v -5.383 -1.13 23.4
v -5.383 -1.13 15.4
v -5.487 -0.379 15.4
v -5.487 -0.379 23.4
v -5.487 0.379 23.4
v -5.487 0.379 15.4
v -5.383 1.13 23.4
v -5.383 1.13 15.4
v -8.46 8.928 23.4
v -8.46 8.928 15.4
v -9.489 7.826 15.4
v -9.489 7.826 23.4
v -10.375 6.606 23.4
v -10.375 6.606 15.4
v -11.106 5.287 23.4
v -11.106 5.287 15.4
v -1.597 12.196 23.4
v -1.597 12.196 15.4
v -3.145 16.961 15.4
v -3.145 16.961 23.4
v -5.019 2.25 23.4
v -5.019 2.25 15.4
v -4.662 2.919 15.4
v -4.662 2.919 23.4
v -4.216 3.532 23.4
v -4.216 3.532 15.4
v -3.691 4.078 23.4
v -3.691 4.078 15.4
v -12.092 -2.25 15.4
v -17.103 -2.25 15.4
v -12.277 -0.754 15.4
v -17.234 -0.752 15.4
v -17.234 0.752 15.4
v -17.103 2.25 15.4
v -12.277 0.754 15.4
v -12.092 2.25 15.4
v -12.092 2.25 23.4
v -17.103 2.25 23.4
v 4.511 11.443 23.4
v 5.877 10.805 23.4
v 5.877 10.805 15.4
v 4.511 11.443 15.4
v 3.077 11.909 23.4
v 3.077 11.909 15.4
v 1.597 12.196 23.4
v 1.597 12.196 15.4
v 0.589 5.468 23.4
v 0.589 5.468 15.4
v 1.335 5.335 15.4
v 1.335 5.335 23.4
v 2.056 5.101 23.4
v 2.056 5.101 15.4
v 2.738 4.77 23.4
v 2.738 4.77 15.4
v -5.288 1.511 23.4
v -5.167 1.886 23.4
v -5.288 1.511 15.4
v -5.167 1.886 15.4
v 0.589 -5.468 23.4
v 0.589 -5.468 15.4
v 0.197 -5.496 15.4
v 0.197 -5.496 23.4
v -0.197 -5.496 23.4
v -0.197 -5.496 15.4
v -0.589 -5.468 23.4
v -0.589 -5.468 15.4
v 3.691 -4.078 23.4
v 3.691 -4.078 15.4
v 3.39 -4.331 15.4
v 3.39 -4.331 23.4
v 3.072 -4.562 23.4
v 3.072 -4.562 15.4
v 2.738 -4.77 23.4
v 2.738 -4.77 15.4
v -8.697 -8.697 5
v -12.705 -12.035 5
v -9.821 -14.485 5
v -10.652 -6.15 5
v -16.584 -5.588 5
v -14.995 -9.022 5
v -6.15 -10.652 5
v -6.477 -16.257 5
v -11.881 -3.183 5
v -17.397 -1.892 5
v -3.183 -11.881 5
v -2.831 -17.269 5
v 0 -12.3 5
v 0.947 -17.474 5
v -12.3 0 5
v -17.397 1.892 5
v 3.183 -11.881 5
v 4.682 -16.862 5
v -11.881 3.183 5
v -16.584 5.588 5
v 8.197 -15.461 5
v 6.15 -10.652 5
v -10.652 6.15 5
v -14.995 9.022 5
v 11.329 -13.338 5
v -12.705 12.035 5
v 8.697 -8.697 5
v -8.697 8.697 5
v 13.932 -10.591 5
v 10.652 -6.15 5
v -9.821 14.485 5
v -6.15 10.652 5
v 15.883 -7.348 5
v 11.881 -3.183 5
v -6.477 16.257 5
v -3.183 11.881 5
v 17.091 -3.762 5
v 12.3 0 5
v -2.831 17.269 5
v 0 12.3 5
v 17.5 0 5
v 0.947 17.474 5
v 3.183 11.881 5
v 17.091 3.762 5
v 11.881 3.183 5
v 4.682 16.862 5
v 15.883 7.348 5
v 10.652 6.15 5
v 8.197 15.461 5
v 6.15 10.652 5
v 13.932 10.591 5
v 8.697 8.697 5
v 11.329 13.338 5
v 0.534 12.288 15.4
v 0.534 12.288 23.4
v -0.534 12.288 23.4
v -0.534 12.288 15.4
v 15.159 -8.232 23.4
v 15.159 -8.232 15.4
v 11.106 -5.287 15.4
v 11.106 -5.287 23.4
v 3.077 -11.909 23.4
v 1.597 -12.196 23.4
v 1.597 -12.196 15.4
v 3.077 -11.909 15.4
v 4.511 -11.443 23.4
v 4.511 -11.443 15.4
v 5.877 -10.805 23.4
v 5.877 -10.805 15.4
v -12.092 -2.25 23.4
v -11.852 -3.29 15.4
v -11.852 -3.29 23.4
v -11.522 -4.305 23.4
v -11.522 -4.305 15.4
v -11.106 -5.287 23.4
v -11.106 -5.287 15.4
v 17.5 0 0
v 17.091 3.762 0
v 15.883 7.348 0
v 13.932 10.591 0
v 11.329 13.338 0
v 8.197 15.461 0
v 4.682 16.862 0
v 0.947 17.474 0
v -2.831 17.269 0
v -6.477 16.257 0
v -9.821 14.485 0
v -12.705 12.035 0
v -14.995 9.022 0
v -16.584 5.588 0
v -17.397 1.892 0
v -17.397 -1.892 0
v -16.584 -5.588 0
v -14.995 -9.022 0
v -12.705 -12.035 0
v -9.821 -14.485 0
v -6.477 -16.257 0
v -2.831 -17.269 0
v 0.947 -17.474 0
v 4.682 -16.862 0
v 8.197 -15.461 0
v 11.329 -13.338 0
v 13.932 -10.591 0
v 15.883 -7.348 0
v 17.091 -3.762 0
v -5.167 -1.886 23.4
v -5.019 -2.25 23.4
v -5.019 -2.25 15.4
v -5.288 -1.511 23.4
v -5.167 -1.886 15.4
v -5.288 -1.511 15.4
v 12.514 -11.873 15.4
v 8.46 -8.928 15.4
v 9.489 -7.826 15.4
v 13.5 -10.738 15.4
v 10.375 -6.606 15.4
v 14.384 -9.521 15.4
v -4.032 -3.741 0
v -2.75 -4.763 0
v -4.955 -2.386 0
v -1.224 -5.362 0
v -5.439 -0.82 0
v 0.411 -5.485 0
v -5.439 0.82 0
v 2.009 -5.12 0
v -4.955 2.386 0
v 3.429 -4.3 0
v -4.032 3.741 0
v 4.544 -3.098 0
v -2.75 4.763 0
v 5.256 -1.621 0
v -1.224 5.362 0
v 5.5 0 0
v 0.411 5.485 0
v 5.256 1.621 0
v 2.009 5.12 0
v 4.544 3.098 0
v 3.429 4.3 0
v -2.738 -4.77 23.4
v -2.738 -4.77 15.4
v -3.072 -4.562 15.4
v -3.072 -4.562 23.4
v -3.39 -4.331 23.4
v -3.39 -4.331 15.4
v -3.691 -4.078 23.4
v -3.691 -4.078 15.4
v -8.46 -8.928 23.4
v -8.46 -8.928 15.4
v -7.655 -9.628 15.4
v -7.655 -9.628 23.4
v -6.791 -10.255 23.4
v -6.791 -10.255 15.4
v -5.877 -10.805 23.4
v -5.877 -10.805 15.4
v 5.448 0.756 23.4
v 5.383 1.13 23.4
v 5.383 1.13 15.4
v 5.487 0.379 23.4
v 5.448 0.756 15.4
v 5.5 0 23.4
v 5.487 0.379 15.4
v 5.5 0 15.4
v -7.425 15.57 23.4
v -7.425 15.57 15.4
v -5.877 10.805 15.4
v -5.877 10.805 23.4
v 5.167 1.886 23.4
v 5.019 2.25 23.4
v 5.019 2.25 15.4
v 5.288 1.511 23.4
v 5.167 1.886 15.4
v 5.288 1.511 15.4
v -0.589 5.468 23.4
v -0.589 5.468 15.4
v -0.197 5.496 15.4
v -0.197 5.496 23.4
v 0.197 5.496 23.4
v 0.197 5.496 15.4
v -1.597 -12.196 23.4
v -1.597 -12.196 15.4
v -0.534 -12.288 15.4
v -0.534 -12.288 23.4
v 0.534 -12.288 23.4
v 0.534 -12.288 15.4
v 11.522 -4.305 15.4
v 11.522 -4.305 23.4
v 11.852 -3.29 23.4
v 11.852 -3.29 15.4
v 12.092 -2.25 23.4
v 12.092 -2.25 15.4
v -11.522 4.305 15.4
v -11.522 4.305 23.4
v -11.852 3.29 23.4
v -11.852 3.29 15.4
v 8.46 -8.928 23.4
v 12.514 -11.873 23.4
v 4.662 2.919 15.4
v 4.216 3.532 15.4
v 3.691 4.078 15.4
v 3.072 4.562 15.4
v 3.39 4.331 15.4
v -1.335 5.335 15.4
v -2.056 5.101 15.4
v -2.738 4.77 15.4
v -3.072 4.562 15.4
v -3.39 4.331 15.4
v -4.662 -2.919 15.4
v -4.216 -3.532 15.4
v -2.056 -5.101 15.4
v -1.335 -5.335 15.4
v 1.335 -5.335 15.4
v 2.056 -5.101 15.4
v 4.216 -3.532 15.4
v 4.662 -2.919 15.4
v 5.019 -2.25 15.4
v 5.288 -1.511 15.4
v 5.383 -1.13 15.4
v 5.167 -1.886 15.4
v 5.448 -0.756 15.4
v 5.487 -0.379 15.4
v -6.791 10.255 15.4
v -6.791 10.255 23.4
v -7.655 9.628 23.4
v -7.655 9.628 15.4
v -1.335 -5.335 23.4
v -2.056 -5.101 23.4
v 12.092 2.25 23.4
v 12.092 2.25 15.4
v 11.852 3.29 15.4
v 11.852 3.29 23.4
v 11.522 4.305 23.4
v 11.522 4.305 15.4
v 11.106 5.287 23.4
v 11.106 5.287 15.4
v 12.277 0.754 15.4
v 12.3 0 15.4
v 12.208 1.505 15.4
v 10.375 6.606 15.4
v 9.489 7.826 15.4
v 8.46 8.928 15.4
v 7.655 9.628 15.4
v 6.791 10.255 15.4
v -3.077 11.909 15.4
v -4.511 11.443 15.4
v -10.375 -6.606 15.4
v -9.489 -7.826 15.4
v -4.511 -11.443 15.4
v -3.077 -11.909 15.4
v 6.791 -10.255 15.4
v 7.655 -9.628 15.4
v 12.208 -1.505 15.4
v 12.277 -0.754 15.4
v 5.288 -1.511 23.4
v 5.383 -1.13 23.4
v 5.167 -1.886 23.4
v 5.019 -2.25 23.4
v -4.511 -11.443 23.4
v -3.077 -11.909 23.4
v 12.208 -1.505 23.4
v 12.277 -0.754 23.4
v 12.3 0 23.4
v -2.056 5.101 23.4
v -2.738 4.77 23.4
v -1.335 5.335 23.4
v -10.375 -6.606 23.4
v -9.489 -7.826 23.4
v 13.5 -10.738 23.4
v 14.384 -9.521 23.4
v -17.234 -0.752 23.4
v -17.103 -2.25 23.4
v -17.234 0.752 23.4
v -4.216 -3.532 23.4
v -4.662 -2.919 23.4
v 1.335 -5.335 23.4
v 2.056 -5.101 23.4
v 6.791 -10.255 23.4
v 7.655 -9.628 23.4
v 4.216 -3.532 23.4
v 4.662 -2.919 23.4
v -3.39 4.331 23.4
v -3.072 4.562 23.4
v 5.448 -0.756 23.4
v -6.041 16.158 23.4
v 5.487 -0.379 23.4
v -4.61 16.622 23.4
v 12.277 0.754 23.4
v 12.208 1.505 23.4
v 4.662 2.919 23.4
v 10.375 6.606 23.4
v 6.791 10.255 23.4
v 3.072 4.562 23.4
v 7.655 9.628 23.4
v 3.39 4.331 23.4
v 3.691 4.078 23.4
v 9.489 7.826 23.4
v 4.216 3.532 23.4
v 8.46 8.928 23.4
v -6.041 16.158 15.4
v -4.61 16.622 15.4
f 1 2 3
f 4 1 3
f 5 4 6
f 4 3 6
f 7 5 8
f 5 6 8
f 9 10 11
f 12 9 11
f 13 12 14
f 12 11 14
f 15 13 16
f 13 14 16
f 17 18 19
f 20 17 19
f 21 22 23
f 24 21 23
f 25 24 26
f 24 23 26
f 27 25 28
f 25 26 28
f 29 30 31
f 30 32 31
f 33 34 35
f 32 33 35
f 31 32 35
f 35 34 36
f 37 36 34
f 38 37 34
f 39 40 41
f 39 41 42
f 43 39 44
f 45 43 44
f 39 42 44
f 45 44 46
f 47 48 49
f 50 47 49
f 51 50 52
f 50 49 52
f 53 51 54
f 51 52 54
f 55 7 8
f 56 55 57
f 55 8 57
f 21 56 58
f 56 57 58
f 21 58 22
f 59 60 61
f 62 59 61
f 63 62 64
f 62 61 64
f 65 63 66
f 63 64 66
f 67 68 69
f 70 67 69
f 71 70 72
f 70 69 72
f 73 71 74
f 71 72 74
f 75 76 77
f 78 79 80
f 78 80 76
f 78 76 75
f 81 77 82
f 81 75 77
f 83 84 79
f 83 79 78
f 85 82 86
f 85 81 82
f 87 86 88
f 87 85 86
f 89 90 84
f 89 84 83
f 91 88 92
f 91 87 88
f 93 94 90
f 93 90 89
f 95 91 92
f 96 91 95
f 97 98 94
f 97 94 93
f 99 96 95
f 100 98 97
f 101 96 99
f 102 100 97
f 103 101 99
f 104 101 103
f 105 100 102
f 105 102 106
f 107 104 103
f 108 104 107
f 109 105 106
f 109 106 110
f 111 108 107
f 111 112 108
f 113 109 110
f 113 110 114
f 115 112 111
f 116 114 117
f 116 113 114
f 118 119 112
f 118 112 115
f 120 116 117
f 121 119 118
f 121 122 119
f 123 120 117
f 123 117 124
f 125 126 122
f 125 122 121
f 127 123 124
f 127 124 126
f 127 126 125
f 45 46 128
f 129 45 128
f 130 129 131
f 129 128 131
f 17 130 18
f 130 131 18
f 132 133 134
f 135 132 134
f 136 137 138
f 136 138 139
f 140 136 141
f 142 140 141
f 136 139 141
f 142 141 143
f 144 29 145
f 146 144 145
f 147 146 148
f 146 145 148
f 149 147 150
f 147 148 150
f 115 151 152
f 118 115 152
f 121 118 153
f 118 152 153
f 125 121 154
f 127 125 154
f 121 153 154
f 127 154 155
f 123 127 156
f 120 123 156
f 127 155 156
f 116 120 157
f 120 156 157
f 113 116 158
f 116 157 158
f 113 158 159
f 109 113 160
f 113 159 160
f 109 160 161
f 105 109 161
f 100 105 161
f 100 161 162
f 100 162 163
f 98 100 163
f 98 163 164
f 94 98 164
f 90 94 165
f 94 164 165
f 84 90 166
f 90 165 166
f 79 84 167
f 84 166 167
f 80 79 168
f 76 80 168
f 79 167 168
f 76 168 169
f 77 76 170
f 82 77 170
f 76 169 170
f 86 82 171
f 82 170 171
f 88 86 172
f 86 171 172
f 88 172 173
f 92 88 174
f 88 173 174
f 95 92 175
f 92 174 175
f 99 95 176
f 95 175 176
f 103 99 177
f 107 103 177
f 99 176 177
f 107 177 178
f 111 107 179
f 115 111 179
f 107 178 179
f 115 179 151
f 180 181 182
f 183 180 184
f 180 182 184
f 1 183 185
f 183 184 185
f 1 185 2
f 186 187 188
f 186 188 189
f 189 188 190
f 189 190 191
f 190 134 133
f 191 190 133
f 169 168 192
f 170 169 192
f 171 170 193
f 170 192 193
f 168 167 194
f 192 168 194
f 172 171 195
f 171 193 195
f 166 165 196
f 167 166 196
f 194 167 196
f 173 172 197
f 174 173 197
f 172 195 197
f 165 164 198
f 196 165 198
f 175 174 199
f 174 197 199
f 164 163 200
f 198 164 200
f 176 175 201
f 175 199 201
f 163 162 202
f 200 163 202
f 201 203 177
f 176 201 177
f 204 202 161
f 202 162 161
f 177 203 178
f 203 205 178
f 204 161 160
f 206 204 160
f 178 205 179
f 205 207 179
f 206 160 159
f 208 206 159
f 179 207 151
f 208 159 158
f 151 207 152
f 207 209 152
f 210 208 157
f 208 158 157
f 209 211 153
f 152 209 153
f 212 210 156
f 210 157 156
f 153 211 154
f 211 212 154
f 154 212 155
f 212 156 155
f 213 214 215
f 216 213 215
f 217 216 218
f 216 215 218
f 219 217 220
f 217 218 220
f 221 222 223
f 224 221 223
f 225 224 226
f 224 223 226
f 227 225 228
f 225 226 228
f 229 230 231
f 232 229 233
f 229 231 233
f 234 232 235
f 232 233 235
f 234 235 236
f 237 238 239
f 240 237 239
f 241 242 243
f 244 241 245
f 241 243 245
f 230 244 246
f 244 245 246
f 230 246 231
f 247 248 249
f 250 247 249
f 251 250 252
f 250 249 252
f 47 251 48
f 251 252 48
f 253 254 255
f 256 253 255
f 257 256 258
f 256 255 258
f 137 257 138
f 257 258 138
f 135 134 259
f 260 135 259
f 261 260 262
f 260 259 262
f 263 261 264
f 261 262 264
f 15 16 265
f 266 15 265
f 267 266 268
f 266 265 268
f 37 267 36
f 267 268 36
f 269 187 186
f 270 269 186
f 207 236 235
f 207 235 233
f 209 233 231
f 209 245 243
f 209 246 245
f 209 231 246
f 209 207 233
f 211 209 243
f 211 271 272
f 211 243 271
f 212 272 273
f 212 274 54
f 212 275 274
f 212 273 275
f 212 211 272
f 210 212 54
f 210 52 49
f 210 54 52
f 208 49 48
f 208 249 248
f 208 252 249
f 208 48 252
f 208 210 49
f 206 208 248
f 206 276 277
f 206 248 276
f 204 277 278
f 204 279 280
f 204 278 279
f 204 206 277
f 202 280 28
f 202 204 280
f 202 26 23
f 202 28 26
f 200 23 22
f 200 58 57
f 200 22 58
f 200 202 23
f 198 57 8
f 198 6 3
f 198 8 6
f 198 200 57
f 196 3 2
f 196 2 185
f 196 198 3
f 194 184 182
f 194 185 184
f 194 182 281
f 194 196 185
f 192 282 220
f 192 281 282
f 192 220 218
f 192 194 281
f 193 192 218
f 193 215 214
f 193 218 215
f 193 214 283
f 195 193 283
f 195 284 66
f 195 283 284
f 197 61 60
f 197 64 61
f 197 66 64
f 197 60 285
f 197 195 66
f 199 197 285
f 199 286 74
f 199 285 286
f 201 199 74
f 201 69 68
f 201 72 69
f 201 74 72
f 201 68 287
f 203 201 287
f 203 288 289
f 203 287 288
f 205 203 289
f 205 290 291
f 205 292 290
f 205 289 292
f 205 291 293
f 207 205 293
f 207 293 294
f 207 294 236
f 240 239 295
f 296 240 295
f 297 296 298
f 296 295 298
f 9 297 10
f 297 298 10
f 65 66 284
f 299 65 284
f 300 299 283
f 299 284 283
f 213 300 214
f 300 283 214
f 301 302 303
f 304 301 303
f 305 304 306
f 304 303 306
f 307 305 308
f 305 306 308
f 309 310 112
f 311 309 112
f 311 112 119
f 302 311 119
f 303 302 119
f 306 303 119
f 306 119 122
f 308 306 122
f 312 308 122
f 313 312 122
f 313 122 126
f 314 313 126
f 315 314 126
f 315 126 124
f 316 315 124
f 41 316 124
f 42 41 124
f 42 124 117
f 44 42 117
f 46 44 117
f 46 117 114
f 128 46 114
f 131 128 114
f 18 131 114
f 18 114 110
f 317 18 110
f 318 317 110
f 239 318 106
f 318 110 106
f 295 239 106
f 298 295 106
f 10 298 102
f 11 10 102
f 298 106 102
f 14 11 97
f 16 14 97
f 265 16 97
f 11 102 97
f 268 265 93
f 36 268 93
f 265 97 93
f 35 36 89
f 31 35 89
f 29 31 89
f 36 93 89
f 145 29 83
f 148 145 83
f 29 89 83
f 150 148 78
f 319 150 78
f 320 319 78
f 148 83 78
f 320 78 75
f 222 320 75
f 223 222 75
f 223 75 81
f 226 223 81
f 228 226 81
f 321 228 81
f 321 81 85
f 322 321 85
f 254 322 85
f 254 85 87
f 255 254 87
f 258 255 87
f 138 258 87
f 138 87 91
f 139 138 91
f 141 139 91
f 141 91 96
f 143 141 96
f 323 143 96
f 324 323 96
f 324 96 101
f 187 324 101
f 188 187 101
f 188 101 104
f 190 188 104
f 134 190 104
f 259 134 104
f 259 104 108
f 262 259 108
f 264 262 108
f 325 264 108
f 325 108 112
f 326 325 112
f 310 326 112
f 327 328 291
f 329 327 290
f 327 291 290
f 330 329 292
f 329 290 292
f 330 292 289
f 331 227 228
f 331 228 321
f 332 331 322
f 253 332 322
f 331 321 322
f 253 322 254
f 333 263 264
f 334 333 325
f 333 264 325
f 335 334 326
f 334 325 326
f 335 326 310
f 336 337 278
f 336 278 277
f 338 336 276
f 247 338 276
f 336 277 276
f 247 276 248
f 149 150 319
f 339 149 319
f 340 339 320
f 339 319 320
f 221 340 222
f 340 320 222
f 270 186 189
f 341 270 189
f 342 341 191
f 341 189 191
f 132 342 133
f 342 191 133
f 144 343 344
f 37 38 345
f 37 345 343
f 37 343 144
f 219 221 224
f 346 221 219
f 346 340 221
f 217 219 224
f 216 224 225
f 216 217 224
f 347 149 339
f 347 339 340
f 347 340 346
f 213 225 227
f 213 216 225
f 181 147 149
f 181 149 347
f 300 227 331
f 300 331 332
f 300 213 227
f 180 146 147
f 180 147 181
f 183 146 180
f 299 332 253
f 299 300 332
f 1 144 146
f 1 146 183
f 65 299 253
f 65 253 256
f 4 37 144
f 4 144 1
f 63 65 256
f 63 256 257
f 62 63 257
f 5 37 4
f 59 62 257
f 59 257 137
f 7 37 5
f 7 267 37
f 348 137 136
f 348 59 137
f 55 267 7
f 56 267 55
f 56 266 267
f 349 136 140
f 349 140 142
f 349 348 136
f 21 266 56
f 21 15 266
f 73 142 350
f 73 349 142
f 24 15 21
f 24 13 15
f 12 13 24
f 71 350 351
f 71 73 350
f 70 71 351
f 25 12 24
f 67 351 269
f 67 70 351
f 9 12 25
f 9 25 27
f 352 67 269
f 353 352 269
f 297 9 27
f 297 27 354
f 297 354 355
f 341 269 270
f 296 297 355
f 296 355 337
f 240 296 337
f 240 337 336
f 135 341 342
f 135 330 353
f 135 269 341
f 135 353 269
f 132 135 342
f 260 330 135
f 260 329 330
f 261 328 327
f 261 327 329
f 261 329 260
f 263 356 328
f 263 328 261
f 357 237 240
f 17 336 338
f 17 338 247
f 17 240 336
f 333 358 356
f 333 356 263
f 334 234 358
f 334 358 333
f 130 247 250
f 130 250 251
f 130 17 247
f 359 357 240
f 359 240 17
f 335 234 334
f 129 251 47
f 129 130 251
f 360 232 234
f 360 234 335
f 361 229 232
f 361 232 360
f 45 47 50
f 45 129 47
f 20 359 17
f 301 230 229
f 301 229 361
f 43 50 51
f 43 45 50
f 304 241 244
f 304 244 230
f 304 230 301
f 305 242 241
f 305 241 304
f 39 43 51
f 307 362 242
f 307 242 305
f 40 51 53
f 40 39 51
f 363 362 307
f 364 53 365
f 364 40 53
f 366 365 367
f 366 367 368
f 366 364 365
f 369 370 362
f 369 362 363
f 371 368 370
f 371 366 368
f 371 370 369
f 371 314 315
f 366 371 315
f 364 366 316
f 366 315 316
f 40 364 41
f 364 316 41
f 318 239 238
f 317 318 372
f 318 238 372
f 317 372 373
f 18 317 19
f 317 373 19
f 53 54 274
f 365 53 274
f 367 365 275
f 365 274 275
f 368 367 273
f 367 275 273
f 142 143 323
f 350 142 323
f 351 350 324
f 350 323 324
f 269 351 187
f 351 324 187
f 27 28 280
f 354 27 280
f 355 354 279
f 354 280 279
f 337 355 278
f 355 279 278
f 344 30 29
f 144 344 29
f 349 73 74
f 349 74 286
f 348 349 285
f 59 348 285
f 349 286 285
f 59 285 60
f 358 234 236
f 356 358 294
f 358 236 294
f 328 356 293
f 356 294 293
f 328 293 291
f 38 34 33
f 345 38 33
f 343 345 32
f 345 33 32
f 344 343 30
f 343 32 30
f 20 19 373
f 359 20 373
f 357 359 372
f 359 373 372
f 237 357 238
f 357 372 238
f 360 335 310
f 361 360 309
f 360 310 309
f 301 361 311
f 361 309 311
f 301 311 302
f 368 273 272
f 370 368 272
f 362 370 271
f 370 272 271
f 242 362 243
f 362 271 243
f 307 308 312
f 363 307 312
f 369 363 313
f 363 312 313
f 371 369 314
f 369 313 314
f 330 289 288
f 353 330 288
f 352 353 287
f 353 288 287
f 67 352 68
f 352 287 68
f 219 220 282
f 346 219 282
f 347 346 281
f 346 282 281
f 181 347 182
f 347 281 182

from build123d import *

# Parameters (mm, degrees)
F0_R     = 17.5
F0_R_2   = 5.5
F1_DEPTH = 5
F2_R     = 12.3
F2_R_2   = 5.5
F3_DEPTH = 10.4
F5_DEPTH = 8


with BuildPart() as f1:
    # F0 (on Top) → F1 (new body)
    with BuildSketch(Plane.XY):
        Circle(F0_R)
        Circle(F0_R_2, mode=Mode.SUBTRACT)
    extrude(amount=F1_DEPTH)

    # F2 (on face) → F3 (join)
    with BuildSketch(Plane.XY.offset(5)):
        Circle(F2_R)
        Circle(F2_R_2, mode=Mode.SUBTRACT)
    extrude(amount=F3_DEPTH)

    # F4 (on face) → F5 (join)
    with BuildSketch(Plane.XY.offset(15.4)):
        with BuildLine():
            Line((-1.5968973469, 12.1958976243), (-3.1451265822, 16.9608572537))
            ThreePointArc((-3.1451265822, 16.9608572537), (-5.330543153, 16.4057249061), (-7.4248809055, 15.5702807791))
            Line((-7.4248809055, 15.5702807791), (-5.8766516702, 10.8053211497))
            ThreePointArc((-5.8766516702, 10.8053211497), (-3.8009090308, 11.6979951504), (-1.5968973469, 12.1958976243))
        make_face()
        with BuildLine():
            ThreePointArc((-17.1026313765, 2.25), (-17.25, 0), (-17.1026313765, -2.25))
            Line((-17.1026313765, -2.25), (-12.0924563262, -2.25))
            ThreePointArc((-12.0924563262, -2.25), (-12.3, 0), (-12.0924563262, 2.25))
            Line((-12.0924563262, 2.25), (-17.1026313765, 2.25))
        make_face()
        with BuildLine():
            ThreePointArc((12.5138026145, -11.8729627358), (13.955543153, -10.139295602), (15.1588362498, -8.2323862612))
            Line((15.1588362498, -8.2323862612), (11.1055194893, -5.2874792552))
            ThreePointArc((11.1055194893, -5.2874792552), (9.9509090308, -7.2297586032), (8.4604858539, -8.9280557298))
            Line((8.4604858539, -8.9280557298), (12.5138026145, -11.8729627358))
        make_face()
        with BuildLine():
            Line((11.1055194893, -5.2874792552), (6.9247879586, -2.25))
            Line((6.9247879586, -2.25), (5.018714975, -2.25))
            ThreePointArc((5.018714975, -2.25), (4.4495934691, -3.2328188876), (3.6907453789, -4.077793343))
            Line((3.6907453789, -4.077793343), (4.2797543233, -5.8905764747))
            Line((4.2797543233, -5.8905764747), (8.4604858539, -8.9280557298))
            ThreePointArc((8.4604858539, -8.9280557298), (9.9509090308, -7.2297586032), (11.1055194893, -5.2874792552))
        make_face()
        with BuildLine():
            ThreePointArc((11.1055194893, -5.2874792552), (11.6979951504, -3.8009090308), (12.0924563262, -2.25))
            Line((12.0924563262, -2.25), (6.9247879586, -2.25))
            Line((6.9247879586, -2.25), (11.1055194893, -5.2874792552))
        make_face()
        with BuildLine():
            Line((6.9247879586, -2.25), (12.0924563262, -2.25))
            ThreePointArc((12.0924563262, -2.25), (12.2480041805, -1.1297759044), (12.3, 0))
            ThreePointArc((12.3, 0), (12.2480041805, 1.1297759044), (12.0924563262, 2.25))
            Line((12.0924563262, 2.25), (6.9247879586, 2.25))
            Line((6.9247879586, 2.25), (5.3827425223, 1.1296384104))
            ThreePointArc((5.3827425223, 1.1296384104), (5.4706070903, 0.5678539104), (5.5, 0))
            ThreePointArc((5.5, 0), (5.4706070903, -0.5678539104), (5.3827425223, -1.1296384104))
            Line((5.3827425223, -1.1296384104), (6.9247879586, -2.25))
        make_face()
        with BuildLine():
            Line((6.9247879586, 2.25), (12.0924563262, 2.25))
            ThreePointArc((12.0924563262, 2.25), (11.6979951504, 3.8009090308), (11.1055194893, 5.2874792552))
            Line((11.1055194893, 5.2874792552), (6.9247879586, 2.25))
        make_face()
        with BuildLine():
            Line((5.018714975, 2.25), (6.9247879586, 2.25))
            Line((6.9247879586, 2.25), (11.1055194893, 5.2874792552))
            ThreePointArc((11.1055194893, 5.2874792552), (9.9509090308, 7.2297586032), (8.4604858539, 8.9280557298))
            Line((8.4604858539, 8.9280557298), (4.2797543233, 5.8905764747))
            Line((4.2797543233, 5.8905764747), (3.6907453789, 4.077793343))
            ThreePointArc((3.6907453789, 4.077793343), (4.4495934691, 3.2328188876), (5.018714975, 2.25))
        make_face()
        with BuildLine():
            Line((4.2797543233, 5.8905764747), (8.4604858539, 8.9280557298))
            ThreePointArc((8.4604858539, 8.9280557298), (7.2297586032, 9.9509090308), (5.8766516702, 10.8053211497))
            Line((5.8766516702, 10.8053211497), (4.2797543233, 5.8905764747))
        make_face()
        with BuildLine():
            Line((2.737708887, 4.7702148851), (4.2797543233, 5.8905764747))
            Line((4.2797543233, 5.8905764747), (5.8766516702, 10.8053211497))
            ThreePointArc((5.8766516702, 10.8053211497), (3.8009090308, 11.6979951504), (1.5968973469, 12.1958976243))
            Line((1.5968973469, 12.1958976243), (0, 7.2811529494))
            Line((0, 7.2811529494), (0.5890089445, 5.4683698177))
            ThreePointArc((0.5890089445, 5.4683698177), (1.6995934691, 5.2308108396), (2.737708887, 4.7702148851))
        make_face()
        with BuildLine():
            Line((0, 7.2811529494), (1.5968973469, 12.1958976243))
            ThreePointArc((1.5968973469, 12.1958976243), (0, 12.3), (-1.5968973469, 12.1958976243))
            Line((-1.5968973469, 12.1958976243), (0, 7.2811529494))
        make_face()
        with BuildLine():
            Line((-0.5890089445, 5.4683698177), (0, 7.2811529494))
            Line((0, 7.2811529494), (-1.5968973469, 12.1958976243))
            ThreePointArc((-1.5968973469, 12.1958976243), (-3.8009090308, 11.6979951504), (-5.8766516702, 10.8053211497))
            Line((-5.8766516702, 10.8053211497), (-4.2797543233, 5.8905764747))
            Line((-4.2797543233, 5.8905764747), (-2.737708887, 4.7702148851))
            ThreePointArc((-2.737708887, 4.7702148851), (-1.6995934691, 5.2308108396), (-0.5890089445, 5.4683698177))
        make_face()
        with BuildLine():
            Line((-4.2797543233, 5.8905764747), (-5.8766516702, 10.8053211497))
            ThreePointArc((-5.8766516702, 10.8053211497), (-7.2297586032, 9.9509090308), (-8.4604858539, 8.9280557298))
            Line((-8.4604858539, 8.9280557298), (-4.2797543233, 5.8905764747))
        make_face()
        with BuildLine():
            Line((-3.6907453789, 4.077793343), (-4.2797543233, 5.8905764747))
            Line((-4.2797543233, 5.8905764747), (-8.4604858539, 8.9280557298))
            ThreePointArc((-8.4604858539, 8.9280557298), (-9.9509090308, 7.2297586032), (-11.1055194893, 5.2874792552))
            Line((-11.1055194893, 5.2874792552), (-6.9247879586, 2.25))
            Line((-6.9247879586, 2.25), (-5.018714975, 2.25))
            ThreePointArc((-5.018714975, 2.25), (-4.4495934691, 3.2328188876), (-3.6907453789, 4.077793343))
        make_face()
        with BuildLine():
            Line((-6.9247879586, 2.25), (-11.1055194893, 5.2874792552))
            ThreePointArc((-11.1055194893, 5.2874792552), (-11.6979951504, 3.8009090308), (-12.0924563262, 2.25))
            Line((-12.0924563262, 2.25), (-6.9247879586, 2.25))
        make_face()
        with BuildLine():
            Line((-12.0924563262, -2.25), (-6.9247879586, -2.25))
            Line((-6.9247879586, -2.25), (-5.3827425223, -1.1296384104))
            ThreePointArc((-5.3827425223, -1.1296384104), (-5.5, 0), (-5.3827425223, 1.1296384104))
            Line((-5.3827425223, 1.1296384104), (-6.9247879586, 2.25))
            Line((-6.9247879586, 2.25), (-12.0924563262, 2.25))
            ThreePointArc((-12.0924563262, 2.25), (-12.3, 0), (-12.0924563262, -2.25))
        make_face()
        with BuildLine():
            ThreePointArc((-12.0924563262, -2.25), (-11.6979951504, -3.8009090308), (-11.1055194893, -5.2874792552))
            Line((-11.1055194893, -5.2874792552), (-6.9247879586, -2.25))
            Line((-6.9247879586, -2.25), (-12.0924563262, -2.25))
        make_face()
        with BuildLine():
            Line((-8.4604858539, -8.9280557298), (-4.2797543233, -5.8905764747))
            Line((-4.2797543233, -5.8905764747), (-3.6907453789, -4.077793343))
            ThreePointArc((-3.6907453789, -4.077793343), (-4.4495934691, -3.2328188876), (-5.018714975, -2.25))
            Line((-5.018714975, -2.25), (-6.9247879586, -2.25))
            Line((-6.9247879586, -2.25), (-11.1055194893, -5.2874792552))
            ThreePointArc((-11.1055194893, -5.2874792552), (-9.9509090308, -7.2297586032), (-8.4604858539, -8.9280557298))
        make_face()
        with BuildLine():
            ThreePointArc((-8.4604858539, -8.9280557298), (-7.2297586032, -9.9509090308), (-5.8766516702, -10.8053211497))
            Line((-5.8766516702, -10.8053211497), (-4.2797543233, -5.8905764747))
            Line((-4.2797543233, -5.8905764747), (-8.4604858539, -8.9280557298))
        make_face()
        with BuildLine():
            Line((-1.5968973469, -12.1958976243), (0, -7.2811529494))
            Line((0, -7.2811529494), (-0.5890089445, -5.4683698177))
            ThreePointArc((-0.5890089445, -5.4683698177), (-1.6995934691, -5.2308108396), (-2.737708887, -4.7702148851))
            Line((-2.737708887, -4.7702148851), (-4.2797543233, -5.8905764747))
            Line((-4.2797543233, -5.8905764747), (-5.8766516702, -10.8053211497))
            ThreePointArc((-5.8766516702, -10.8053211497), (-3.8009090308, -11.6979951504), (-1.5968973469, -12.1958976243))
        make_face()
        with BuildLine():
            ThreePointArc((-1.5968973469, -12.1958976243), (0, -12.3), (1.5968973469, -12.1958976243))
            Line((1.5968973469, -12.1958976243), (0, -7.2811529494))
            Line((0, -7.2811529494), (-1.5968973469, -12.1958976243))
        make_face()
        with BuildLine():
            Line((5.8766516702, -10.8053211497), (4.2797543233, -5.8905764747))
            Line((4.2797543233, -5.8905764747), (2.737708887, -4.7702148851))
            ThreePointArc((2.737708887, -4.7702148851), (1.6995934691, -5.2308108396), (0.5890089445, -5.4683698177))
            Line((0.5890089445, -5.4683698177), (0, -7.2811529494))
            Line((0, -7.2811529494), (1.5968973469, -12.1958976243))
            ThreePointArc((1.5968973469, -12.1958976243), (3.8009090308, -11.6979951504), (5.8766516702, -10.8053211497))
        make_face()
        with BuildLine():
            ThreePointArc((5.8766516702, -10.8053211497), (7.2297586032, -9.9509090308), (8.4604858539, -8.9280557298))
            Line((8.4604858539, -8.9280557298), (4.2797543233, -5.8905764747))
            Line((4.2797543233, -5.8905764747), (5.8766516702, -10.8053211497))
        make_face()
        with BuildLine():
            Line((4.2797543233, -5.8905764747), (3.6907453789, -4.077793343))
            ThreePointArc((3.6907453789, -4.077793343), (3.2328188876, -4.4495934691), (2.737708887, -4.7702148851))
            Line((2.737708887, -4.7702148851), (4.2797543233, -5.8905764747))
        make_face()
        with BuildLine():
            Line((5.018714975, -2.25), (6.9247879586, -2.25))
            Line((6.9247879586, -2.25), (5.3827425223, -1.1296384104))
            ThreePointArc((5.3827425223, -1.1296384104), (5.2308108396, -1.6995934691), (5.018714975, -2.25))
        make_face()
        with BuildLine():
            Line((5.3827425223, 1.1296384104), (6.9247879586, 2.25))
            Line((6.9247879586, 2.25), (5.018714975, 2.25))
            ThreePointArc((5.018714975, 2.25), (5.2308108396, 1.6995934691), (5.3827425223, 1.1296384104))
        make_face()
        with BuildLine():
            ThreePointArc((2.737708887, 4.7702148851), (3.2328188876, 4.4495934691), (3.6907453789, 4.077793343))
            Line((3.6907453789, 4.077793343), (4.2797543233, 5.8905764747))
            Line((4.2797543233, 5.8905764747), (2.737708887, 4.7702148851))
        make_face()
        with BuildLine():
            ThreePointArc((-0.5890089445, 5.4683698177), (0, 5.5), (0.5890089445, 5.4683698177))
            Line((0.5890089445, 5.4683698177), (0, 7.2811529494))
            Line((0, 7.2811529494), (-0.5890089445, 5.4683698177))
        make_face()
        with BuildLine():
            ThreePointArc((-3.6907453789, 4.077793343), (-3.2328188876, 4.4495934691), (-2.737708887, 4.7702148851))
            Line((-2.737708887, 4.7702148851), (-4.2797543233, 5.8905764747))
            Line((-4.2797543233, 5.8905764747), (-3.6907453789, 4.077793343))
        make_face()
        with BuildLine():
            Line((-6.9247879586, 2.25), (-5.3827425223, 1.1296384104))
            ThreePointArc((-5.3827425223, 1.1296384104), (-5.2308108396, 1.6995934691), (-5.018714975, 2.25))
            Line((-5.018714975, 2.25), (-6.9247879586, 2.25))
        make_face()
        with BuildLine():
            Line((-6.9247879586, -2.25), (-5.018714975, -2.25))
            ThreePointArc((-5.018714975, -2.25), (-5.2308108396, -1.6995934691), (-5.3827425223, -1.1296384104))
            Line((-5.3827425223, -1.1296384104), (-6.9247879586, -2.25))
        make_face()
        with BuildLine():
            Line((-4.2797543233, -5.8905764747), (-2.737708887, -4.7702148851))
            ThreePointArc((-2.737708887, -4.7702148851), (-3.2328188876, -4.4495934691), (-3.6907453789, -4.077793343))
            Line((-3.6907453789, -4.077793343), (-4.2797543233, -5.8905764747))
        make_face()
        with BuildLine():
            Line((0, -7.2811529494), (0.5890089445, -5.4683698177))
            ThreePointArc((0.5890089445, -5.4683698177), (0, -5.5), (-0.5890089445, -5.4683698177))
            Line((-0.5890089445, -5.4683698177), (0, -7.2811529494))
        make_face()
    extrude(amount=F5_DEPTH)


solid = f1.part
